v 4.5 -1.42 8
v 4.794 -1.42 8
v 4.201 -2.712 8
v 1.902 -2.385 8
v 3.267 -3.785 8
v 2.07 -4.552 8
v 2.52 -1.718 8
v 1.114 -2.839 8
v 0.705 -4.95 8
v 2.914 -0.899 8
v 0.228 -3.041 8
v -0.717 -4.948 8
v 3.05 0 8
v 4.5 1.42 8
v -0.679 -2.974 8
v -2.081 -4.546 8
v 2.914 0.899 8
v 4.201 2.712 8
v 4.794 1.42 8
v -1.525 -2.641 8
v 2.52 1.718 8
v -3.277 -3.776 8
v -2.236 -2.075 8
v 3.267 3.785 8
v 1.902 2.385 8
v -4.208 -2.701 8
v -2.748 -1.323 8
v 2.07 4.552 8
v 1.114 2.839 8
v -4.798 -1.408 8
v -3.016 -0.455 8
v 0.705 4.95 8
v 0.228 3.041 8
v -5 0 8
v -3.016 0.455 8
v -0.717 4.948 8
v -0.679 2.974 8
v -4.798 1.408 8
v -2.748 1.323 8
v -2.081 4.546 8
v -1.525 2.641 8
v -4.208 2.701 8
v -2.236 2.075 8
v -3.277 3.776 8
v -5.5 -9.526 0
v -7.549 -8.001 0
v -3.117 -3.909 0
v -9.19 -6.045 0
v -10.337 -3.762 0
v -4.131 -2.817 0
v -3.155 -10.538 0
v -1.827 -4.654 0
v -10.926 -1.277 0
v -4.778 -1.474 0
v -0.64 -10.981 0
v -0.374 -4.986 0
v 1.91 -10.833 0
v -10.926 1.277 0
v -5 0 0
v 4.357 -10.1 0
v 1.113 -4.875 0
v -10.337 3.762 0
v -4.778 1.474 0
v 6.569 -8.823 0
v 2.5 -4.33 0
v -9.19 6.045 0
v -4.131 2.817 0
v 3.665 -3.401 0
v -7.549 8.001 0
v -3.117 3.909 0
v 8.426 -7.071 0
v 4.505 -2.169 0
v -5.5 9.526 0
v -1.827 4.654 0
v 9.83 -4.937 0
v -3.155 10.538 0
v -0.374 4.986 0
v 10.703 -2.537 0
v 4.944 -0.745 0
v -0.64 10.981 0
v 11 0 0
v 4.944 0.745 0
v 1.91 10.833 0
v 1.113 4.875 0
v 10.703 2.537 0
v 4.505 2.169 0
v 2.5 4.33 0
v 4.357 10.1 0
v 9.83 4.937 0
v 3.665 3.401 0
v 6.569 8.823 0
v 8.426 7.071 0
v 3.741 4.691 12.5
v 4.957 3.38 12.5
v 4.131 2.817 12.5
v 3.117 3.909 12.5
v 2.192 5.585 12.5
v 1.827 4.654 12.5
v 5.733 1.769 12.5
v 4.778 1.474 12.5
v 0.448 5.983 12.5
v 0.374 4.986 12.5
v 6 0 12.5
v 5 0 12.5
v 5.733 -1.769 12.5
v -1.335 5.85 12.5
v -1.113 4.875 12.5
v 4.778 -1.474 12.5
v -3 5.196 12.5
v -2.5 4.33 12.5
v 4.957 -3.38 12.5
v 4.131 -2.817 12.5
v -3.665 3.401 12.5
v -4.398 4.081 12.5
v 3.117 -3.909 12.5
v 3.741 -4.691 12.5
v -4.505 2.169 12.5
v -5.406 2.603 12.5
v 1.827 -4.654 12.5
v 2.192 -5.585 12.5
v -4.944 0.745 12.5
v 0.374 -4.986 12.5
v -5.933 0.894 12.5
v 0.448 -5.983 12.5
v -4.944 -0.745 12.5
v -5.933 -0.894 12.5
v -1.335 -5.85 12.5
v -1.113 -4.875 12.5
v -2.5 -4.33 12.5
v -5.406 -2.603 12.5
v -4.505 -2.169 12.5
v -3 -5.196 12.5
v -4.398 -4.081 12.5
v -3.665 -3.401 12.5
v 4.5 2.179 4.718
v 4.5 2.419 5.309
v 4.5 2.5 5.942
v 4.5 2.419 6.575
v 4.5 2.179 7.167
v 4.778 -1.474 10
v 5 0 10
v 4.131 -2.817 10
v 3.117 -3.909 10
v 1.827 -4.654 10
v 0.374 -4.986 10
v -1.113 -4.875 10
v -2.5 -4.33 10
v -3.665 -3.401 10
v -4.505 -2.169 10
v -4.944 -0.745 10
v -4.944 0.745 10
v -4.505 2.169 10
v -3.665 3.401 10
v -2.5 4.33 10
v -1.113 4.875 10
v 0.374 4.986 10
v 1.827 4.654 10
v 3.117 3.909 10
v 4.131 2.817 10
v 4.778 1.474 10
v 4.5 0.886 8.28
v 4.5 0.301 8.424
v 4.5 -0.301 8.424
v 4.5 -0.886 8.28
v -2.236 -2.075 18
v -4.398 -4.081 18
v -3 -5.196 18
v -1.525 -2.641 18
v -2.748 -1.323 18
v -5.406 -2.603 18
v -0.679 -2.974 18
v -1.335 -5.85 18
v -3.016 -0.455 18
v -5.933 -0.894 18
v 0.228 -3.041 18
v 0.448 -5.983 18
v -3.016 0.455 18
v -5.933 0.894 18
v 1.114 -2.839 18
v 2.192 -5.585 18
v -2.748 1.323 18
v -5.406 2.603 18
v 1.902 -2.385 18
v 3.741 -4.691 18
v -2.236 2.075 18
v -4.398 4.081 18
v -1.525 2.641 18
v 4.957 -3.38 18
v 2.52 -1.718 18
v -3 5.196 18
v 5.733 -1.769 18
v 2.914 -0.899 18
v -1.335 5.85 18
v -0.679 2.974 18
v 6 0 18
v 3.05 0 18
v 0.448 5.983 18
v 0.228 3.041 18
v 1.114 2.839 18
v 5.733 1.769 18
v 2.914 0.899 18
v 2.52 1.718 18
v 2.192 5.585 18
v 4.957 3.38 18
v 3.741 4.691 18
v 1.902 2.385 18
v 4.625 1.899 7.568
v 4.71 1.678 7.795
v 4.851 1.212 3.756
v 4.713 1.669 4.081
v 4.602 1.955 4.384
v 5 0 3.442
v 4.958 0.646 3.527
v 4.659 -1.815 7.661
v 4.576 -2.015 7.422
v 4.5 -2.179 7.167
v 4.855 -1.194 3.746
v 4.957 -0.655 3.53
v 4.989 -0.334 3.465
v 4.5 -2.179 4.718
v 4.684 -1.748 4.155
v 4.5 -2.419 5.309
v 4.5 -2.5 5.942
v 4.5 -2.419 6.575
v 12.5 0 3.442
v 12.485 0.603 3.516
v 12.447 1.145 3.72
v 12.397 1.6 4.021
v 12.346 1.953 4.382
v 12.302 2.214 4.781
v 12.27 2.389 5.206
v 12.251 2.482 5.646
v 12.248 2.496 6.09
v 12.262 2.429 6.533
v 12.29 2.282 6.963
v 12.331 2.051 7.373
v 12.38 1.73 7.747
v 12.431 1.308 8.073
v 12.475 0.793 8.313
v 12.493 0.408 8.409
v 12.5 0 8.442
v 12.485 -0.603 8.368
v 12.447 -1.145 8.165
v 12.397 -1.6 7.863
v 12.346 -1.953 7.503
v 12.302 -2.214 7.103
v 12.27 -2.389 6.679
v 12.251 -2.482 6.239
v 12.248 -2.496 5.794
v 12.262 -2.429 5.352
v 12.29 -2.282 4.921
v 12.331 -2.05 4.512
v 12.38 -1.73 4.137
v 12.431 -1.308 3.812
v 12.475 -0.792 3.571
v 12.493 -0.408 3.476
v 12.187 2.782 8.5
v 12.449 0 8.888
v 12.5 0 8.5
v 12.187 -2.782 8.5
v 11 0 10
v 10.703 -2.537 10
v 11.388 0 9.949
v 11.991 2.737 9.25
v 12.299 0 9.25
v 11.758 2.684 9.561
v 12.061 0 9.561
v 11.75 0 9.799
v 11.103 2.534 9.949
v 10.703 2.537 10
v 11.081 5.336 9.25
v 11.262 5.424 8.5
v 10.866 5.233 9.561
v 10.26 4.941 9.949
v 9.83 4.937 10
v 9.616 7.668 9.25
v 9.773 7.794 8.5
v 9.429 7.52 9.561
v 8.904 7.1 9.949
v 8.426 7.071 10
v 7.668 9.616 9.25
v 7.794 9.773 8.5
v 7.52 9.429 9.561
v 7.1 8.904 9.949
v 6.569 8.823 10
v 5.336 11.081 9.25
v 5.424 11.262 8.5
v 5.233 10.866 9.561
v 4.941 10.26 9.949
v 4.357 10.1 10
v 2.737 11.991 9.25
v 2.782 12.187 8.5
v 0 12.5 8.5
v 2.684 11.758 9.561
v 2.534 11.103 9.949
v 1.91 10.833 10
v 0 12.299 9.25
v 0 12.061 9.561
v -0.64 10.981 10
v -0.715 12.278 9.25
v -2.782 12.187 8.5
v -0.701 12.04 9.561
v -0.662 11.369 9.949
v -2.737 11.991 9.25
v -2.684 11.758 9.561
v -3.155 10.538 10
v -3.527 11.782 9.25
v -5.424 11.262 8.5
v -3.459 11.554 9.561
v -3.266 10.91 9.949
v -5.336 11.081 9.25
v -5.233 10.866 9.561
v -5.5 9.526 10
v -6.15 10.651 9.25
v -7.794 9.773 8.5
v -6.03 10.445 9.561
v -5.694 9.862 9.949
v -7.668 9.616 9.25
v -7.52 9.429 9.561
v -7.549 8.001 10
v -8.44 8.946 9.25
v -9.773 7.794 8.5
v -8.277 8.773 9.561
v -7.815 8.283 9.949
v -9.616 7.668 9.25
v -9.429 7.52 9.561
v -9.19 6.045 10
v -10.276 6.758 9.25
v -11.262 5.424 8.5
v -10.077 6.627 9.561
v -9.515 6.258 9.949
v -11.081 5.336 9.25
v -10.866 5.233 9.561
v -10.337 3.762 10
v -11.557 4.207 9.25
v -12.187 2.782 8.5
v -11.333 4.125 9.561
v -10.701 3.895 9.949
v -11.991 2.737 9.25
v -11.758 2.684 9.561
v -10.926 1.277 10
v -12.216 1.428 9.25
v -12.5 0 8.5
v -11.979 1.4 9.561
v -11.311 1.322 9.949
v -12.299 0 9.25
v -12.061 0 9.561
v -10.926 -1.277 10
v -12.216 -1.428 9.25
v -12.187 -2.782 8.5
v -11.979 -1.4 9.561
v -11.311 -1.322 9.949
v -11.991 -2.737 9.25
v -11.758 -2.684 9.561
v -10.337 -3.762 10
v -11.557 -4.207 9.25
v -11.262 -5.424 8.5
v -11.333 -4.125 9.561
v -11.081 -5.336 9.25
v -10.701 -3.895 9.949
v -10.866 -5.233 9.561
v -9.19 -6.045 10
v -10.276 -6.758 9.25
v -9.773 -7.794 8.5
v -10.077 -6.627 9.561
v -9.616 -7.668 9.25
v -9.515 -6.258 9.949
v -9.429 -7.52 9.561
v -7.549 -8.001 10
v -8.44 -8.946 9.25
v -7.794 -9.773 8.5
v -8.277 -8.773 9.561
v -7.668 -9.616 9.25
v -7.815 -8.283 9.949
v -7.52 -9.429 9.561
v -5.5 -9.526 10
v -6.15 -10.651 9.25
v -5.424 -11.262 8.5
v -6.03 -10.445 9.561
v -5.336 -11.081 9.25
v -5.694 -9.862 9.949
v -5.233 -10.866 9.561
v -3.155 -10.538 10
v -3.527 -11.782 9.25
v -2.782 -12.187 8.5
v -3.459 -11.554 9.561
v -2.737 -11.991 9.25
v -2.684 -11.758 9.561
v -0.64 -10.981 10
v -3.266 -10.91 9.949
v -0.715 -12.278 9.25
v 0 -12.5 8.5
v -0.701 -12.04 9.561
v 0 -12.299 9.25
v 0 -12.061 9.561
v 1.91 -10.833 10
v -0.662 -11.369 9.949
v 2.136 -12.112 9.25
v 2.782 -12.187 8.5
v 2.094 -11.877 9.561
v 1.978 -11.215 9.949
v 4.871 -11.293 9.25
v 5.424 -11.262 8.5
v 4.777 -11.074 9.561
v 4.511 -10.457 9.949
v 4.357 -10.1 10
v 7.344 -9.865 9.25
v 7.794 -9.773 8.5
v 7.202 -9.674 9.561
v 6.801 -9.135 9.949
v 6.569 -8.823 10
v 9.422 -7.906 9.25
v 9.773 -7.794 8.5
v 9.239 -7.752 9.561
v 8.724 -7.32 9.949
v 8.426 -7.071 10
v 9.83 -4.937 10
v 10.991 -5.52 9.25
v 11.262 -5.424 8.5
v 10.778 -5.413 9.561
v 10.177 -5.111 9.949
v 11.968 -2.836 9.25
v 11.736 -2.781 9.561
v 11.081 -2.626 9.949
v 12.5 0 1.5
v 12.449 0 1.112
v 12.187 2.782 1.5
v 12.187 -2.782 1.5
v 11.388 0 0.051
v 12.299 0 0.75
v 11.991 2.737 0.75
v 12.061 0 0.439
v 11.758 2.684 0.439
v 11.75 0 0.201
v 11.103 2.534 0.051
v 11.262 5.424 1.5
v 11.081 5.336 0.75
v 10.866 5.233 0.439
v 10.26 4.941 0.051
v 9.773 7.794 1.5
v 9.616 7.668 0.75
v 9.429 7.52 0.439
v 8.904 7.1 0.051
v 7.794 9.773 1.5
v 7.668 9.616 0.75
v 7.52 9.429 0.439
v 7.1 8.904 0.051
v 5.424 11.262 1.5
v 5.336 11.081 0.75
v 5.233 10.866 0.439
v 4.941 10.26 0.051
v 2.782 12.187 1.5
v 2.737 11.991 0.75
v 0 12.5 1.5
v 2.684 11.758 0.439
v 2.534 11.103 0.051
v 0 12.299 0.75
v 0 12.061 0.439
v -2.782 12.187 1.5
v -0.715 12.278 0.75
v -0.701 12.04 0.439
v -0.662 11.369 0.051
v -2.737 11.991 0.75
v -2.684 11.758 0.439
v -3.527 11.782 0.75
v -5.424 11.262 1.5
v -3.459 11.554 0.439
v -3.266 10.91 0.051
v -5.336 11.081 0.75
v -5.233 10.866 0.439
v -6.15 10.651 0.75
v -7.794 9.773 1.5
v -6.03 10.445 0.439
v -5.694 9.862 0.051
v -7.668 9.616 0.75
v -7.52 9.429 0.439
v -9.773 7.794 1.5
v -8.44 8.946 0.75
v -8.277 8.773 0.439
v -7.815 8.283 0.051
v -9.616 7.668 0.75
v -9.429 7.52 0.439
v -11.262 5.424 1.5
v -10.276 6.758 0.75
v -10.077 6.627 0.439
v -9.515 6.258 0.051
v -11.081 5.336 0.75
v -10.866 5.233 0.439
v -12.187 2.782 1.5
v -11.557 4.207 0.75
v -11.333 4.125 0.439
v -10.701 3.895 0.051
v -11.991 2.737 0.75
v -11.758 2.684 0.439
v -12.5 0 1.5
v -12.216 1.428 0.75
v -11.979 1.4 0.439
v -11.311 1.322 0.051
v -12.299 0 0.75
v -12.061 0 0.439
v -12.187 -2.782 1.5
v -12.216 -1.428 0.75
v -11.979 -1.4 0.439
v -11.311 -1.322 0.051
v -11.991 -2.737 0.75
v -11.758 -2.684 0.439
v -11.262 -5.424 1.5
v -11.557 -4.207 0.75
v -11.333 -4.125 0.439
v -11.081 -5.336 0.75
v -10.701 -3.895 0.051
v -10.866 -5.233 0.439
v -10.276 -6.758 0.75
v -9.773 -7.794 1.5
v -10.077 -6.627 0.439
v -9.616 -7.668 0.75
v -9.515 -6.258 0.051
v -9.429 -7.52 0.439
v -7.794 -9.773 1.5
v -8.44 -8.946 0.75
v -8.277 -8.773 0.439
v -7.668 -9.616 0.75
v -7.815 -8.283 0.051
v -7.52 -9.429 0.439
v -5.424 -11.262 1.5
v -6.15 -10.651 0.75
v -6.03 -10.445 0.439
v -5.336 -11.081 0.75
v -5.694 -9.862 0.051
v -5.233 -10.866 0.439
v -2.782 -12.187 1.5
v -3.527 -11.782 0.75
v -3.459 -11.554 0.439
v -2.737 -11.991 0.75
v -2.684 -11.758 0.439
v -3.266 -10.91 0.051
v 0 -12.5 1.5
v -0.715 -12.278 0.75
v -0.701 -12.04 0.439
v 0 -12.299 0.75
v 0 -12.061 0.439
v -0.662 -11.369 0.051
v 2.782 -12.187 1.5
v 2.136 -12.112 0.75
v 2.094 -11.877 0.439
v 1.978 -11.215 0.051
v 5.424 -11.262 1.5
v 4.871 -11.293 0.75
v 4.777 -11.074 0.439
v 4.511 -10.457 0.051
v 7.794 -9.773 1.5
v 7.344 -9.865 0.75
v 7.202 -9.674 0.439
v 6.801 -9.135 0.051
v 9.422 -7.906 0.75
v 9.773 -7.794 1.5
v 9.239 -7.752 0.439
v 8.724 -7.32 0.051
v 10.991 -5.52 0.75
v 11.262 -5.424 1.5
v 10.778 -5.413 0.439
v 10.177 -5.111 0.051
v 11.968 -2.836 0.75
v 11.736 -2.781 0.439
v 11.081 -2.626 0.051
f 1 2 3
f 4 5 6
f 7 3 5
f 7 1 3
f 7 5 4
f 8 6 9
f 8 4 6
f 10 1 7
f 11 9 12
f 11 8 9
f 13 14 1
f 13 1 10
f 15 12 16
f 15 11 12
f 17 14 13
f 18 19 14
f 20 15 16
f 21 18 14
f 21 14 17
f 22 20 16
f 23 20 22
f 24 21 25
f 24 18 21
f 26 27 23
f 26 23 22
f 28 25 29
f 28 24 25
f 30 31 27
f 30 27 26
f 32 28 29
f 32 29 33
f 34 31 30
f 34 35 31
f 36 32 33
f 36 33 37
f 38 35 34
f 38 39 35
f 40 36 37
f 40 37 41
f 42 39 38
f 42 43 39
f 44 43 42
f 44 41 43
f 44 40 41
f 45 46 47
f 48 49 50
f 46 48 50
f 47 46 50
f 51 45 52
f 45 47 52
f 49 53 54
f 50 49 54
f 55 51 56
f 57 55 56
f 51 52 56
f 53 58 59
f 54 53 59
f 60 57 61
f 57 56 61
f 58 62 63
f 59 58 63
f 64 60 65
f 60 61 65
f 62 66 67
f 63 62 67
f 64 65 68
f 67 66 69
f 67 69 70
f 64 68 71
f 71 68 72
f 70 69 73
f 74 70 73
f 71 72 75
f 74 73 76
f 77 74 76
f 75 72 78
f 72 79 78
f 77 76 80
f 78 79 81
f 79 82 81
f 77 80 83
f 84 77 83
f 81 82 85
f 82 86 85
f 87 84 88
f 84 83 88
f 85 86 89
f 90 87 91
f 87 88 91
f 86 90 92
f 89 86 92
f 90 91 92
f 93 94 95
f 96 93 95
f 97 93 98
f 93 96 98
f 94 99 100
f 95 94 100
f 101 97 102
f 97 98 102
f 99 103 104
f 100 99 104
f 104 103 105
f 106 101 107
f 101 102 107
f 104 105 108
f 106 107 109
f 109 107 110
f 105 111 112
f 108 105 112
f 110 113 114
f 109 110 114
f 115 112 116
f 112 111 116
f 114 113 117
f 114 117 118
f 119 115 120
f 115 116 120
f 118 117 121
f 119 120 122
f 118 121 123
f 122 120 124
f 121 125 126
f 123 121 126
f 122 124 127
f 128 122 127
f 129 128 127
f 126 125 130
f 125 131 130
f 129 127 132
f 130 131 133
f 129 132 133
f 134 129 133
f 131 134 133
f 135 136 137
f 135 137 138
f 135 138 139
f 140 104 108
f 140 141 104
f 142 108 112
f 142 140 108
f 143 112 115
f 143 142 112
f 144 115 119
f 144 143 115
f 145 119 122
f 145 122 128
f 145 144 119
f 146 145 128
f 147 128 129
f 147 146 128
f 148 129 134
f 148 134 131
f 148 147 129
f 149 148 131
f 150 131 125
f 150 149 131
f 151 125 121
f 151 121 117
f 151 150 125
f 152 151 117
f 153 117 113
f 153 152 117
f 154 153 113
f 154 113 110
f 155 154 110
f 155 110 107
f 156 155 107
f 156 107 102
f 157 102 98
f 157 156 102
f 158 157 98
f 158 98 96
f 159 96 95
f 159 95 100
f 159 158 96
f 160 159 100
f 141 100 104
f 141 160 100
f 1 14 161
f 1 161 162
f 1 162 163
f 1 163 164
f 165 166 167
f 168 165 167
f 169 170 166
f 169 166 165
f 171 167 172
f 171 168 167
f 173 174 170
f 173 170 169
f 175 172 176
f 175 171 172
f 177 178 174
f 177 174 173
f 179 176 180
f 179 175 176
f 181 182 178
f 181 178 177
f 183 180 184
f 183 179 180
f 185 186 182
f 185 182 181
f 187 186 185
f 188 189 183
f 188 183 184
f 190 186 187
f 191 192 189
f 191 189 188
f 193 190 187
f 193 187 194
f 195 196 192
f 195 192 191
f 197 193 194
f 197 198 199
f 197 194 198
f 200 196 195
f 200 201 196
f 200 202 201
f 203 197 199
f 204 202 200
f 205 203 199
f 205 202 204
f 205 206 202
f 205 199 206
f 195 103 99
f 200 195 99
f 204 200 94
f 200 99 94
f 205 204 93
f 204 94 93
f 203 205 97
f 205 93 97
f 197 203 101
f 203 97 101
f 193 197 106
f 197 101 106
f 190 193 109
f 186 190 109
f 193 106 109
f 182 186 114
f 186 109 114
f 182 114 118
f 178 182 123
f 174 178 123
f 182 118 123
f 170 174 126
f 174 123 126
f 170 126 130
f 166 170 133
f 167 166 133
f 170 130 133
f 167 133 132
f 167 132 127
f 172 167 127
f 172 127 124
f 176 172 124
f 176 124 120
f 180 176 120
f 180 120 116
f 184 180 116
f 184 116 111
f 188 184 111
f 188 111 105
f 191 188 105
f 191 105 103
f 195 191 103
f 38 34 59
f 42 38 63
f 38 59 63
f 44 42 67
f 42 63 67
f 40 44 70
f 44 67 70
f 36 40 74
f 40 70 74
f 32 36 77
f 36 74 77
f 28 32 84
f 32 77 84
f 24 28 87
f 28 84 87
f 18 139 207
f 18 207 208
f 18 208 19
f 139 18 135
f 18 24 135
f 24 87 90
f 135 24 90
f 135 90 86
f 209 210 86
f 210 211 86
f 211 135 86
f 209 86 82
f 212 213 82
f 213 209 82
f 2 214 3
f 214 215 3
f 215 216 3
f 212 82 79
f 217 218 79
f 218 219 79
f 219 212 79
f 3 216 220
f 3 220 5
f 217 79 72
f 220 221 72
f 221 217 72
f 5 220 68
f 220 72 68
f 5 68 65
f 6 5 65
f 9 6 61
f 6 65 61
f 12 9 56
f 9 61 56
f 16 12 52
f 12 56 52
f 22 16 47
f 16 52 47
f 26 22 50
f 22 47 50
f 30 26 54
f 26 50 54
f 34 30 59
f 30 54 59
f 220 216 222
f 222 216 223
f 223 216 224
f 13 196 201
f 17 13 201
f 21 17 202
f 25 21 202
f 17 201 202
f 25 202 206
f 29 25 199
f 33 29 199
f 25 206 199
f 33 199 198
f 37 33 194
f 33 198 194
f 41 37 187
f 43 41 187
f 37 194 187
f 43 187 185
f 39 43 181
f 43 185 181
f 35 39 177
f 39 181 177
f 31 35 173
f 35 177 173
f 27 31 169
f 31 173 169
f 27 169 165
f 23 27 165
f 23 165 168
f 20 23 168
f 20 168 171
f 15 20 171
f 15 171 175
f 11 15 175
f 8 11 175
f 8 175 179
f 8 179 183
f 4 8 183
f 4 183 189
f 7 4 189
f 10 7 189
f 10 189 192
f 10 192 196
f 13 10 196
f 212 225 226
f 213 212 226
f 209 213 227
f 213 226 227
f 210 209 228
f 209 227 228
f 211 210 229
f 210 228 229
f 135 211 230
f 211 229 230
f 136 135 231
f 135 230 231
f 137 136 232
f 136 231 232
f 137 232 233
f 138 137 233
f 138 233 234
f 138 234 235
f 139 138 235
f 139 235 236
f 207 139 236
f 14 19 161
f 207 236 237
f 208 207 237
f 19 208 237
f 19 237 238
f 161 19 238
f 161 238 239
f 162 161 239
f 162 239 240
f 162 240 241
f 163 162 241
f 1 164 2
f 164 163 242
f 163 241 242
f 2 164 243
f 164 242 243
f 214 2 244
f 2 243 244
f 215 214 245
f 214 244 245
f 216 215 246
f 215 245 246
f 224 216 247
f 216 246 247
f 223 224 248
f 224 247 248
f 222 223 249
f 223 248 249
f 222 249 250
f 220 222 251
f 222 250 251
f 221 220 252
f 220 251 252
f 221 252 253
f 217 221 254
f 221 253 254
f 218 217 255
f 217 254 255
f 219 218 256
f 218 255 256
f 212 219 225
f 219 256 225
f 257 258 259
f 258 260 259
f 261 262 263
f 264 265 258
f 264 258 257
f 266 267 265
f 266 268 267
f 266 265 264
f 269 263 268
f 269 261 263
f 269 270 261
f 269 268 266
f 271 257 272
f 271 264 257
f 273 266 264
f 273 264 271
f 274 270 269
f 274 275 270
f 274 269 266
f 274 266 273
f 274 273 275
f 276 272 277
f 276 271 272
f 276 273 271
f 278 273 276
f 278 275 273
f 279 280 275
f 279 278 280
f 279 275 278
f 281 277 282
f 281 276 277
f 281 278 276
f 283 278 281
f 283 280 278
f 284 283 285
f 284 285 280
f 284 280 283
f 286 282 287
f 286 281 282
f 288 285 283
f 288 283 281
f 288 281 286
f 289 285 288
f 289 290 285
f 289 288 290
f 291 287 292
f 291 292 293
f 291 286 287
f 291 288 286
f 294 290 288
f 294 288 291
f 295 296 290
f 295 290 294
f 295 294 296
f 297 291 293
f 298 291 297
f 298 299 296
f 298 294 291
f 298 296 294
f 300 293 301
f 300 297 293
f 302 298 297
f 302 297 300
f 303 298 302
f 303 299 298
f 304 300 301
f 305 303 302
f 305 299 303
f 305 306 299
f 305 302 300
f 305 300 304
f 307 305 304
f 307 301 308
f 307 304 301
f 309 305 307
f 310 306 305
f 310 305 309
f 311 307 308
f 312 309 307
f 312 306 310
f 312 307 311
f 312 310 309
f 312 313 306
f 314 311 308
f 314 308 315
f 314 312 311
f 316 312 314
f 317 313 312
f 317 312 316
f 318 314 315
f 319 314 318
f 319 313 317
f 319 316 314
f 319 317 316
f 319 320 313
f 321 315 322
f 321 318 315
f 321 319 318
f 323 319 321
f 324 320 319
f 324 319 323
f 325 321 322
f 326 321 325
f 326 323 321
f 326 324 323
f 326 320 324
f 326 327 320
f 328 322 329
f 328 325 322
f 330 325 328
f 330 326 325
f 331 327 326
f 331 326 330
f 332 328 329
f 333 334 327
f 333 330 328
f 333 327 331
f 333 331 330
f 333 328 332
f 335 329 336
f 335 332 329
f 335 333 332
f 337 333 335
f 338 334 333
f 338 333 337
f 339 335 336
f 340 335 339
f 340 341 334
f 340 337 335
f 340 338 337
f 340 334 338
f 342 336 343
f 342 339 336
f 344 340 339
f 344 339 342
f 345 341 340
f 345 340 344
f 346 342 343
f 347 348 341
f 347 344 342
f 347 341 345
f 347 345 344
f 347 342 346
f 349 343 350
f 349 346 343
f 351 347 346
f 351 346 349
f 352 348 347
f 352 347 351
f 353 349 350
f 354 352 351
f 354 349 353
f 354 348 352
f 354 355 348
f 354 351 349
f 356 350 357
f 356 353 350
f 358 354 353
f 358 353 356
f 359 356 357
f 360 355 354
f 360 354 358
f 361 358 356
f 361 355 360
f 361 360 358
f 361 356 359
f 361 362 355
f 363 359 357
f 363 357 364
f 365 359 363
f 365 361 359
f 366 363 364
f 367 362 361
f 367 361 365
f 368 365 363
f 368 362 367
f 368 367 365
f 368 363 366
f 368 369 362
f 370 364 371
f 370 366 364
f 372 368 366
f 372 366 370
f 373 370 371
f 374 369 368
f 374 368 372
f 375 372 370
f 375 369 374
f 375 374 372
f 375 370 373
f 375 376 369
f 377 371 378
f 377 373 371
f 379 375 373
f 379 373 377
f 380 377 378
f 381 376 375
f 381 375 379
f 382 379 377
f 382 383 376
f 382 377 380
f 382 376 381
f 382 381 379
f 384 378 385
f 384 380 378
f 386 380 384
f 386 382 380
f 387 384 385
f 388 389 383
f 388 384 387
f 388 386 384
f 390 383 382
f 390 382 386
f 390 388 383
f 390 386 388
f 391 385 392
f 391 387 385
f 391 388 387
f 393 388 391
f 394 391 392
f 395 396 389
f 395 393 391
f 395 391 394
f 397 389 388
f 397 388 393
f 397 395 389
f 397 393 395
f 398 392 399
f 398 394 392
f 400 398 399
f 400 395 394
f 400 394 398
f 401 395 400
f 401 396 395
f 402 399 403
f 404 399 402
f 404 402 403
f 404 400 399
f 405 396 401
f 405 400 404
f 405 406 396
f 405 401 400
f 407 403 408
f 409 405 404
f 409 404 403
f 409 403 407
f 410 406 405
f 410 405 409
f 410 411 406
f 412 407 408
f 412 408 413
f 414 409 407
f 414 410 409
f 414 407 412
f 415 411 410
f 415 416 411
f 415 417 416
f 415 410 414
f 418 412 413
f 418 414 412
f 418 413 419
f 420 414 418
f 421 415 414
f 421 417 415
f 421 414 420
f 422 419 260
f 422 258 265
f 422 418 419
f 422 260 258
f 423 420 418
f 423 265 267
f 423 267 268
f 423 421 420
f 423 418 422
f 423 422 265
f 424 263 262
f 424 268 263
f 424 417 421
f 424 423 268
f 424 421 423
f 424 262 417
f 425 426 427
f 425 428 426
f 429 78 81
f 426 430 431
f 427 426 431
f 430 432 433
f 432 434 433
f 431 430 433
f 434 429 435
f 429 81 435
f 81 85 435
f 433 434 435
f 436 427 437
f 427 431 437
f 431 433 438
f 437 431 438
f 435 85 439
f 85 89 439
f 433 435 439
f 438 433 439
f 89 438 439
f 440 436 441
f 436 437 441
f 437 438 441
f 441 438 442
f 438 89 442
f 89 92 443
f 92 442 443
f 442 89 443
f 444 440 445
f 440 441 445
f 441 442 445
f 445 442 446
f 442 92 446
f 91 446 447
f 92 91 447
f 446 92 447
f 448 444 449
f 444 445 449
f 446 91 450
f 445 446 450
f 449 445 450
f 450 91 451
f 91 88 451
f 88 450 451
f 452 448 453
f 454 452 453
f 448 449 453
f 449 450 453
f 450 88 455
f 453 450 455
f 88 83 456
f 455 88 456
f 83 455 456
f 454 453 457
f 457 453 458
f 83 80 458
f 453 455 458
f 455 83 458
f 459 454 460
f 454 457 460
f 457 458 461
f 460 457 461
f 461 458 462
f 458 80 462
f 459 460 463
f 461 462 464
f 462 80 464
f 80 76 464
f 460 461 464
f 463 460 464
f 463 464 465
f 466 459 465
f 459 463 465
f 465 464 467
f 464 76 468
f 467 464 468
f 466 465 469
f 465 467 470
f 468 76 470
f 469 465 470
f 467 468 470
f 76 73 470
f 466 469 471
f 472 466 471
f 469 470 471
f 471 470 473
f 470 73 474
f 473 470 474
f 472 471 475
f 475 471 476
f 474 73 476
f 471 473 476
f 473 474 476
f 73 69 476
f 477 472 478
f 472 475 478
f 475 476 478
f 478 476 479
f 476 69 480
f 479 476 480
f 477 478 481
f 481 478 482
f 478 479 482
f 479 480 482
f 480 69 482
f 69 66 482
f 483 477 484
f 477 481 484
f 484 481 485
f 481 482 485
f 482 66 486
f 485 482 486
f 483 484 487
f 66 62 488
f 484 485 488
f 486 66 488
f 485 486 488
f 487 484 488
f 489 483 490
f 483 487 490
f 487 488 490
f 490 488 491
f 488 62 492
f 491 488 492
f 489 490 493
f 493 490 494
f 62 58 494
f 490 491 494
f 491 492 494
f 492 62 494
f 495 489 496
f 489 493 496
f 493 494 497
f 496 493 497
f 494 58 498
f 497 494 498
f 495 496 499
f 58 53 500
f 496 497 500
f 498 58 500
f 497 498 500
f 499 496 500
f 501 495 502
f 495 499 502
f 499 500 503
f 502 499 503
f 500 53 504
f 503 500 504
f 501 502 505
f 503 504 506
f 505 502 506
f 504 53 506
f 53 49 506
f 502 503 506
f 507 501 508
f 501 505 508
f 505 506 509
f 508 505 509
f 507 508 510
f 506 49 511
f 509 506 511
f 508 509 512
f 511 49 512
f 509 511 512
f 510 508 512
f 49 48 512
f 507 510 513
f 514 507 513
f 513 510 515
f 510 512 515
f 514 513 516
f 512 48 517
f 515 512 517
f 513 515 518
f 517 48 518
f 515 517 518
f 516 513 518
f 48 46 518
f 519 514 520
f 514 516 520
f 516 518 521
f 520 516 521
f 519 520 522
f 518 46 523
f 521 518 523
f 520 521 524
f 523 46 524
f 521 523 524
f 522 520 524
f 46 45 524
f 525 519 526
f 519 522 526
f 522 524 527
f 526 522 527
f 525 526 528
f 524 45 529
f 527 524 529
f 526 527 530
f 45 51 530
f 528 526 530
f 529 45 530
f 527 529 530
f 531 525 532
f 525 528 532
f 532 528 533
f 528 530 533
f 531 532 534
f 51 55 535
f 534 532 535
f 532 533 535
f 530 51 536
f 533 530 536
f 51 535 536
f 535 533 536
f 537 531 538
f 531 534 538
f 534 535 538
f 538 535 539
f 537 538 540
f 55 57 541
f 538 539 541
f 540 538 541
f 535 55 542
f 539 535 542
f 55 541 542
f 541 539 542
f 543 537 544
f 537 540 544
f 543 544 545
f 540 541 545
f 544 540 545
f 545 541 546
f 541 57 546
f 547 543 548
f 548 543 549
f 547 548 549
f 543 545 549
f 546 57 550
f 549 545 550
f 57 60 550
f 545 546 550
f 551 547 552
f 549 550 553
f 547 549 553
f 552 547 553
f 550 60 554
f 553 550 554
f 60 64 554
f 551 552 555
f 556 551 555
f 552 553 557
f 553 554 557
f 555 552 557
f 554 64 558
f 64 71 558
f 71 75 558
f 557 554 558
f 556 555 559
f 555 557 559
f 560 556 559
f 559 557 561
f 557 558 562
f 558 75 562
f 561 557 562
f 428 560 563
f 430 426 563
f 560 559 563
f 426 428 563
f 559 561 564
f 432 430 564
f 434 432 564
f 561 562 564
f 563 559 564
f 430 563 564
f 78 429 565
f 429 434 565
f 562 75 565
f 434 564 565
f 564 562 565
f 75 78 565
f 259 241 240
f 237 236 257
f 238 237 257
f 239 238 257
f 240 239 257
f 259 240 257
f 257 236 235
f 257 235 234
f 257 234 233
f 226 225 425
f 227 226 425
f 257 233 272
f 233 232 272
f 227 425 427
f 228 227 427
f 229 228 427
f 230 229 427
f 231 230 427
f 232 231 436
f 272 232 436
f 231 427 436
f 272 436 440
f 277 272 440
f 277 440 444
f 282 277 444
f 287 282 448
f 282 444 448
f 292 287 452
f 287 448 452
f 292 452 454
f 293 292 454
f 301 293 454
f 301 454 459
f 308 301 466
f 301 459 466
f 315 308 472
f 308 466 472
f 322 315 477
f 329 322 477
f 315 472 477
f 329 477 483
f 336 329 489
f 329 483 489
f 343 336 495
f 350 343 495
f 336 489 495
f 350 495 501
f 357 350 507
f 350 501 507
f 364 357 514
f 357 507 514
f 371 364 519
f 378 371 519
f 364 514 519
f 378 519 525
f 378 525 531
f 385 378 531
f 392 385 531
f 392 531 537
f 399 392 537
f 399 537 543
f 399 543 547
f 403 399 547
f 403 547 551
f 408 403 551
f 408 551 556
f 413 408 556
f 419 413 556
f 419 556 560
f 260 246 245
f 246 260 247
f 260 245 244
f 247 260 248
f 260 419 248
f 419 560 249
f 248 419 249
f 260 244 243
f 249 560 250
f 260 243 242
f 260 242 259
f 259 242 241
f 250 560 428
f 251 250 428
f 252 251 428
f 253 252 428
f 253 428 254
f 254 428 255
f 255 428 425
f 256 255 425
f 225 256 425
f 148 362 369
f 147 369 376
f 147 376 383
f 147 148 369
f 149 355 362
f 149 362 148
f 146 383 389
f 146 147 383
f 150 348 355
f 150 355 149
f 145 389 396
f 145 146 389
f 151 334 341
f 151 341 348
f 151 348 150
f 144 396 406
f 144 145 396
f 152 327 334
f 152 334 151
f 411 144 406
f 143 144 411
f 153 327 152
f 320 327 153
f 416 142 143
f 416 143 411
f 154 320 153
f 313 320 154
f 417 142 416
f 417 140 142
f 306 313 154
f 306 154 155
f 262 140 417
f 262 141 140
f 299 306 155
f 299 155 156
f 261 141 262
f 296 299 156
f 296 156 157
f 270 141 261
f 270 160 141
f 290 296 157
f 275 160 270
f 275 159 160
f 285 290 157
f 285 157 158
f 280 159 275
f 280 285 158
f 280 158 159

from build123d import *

# Parameters (mm, degrees)
ESQUISSE1_R             = 12.5
BASE_EXTRUSION_DEPTH    = 10
ESQUISSE2_R             = 6
BOSS_EXTRU_1_DEPTH      = 8
ESQUISSE3_R             = 3.05
ENL_V_MAT_EXTRU_1_DEPTH = 26.228951623
ESQUISSE4_R             = 5
ENL_V_MAT_EXTRU_2_DEPTH = 8
ESQUISSE5_W             = 2.5
ESQUISSE5_H             = 2
CONG_1_R                = 1.5
ESQUISSE7_R             = 2.5
ENL_V_MAT_EXTRU_4_DEPTH = 8


with BuildPart() as part:
    # Esquisse1 → Base-Extrusion (new body)
    with BuildSketch(Plane.XY):
        Circle(ESQUISSE1_R)
    extrude(amount=BASE_EXTRUSION_DEPTH)

    # Esquisse2 → Boss.-Extru.1 (add)
    with BuildSketch(Plane.XY.offset(10)):
        Circle(ESQUISSE2_R)
    extrude(amount=BOSS_EXTRU_1_DEPTH)

    # Esquisse3 → Enlèv. mat.-Extru.1 (cut, through all)
    with BuildSketch(Plane.XY.offset(18)):
        Circle(ESQUISSE3_R)
    extrude(amount=-ENL_V_MAT_EXTRU_1_DEPTH, mode=Mode.SUBTRACT)

    # Esquisse4 → Enlèv. mat.-Extru.2 (cut)
    with BuildSketch(Plane(origin=(0, 0, 0), x_dir=(-1, 0, 0), z_dir=(0, 0, -1))):
        Circle(ESQUISSE4_R)
    extrude(amount=-ENL_V_MAT_EXTRU_2_DEPTH, mode=Mode.SUBTRACT)

    # Esquisse5 → Enlever de la matière-Révolution1 (revolve, cut)
    with BuildSketch(Plane(origin=(0, 0, 0), x_dir=(0, 0, -1), z_dir=(1, 0, 0)), mode=Mode.PRIVATE) as enlever_de_la_mati_re_r_volution1_sk:
        with Locations((-11.25, 6)):
            Rectangle(ESQUISSE5_W, ESQUISSE5_H)
    revolve(enlever_de_la_mati_re_r_volution1_sk.sketch.rotate(Axis((0, 0, 21.399826727), (0, 0, -1)), 90), axis=Axis((0, 0, 21.399826727), (0, 0, -1)), mode=Mode.SUBTRACT)

    # Congé1
    cong_1_edges = [part.edges().sort_by_distance(p)[0] for p in [
        (-12.5, 0, 0),
        (-12.5, 0, 10),
    ]]
    fillet(cong_1_edges, radius=CONG_1_R)

    # Esquisse7 → Enlèv. mat.-Extru.4 (cut)
    with BuildSketch(Plane(origin=(12.5, 0, 0), x_dir=(0, 0, -1), z_dir=(1, 0, 0))):
        with Locations((-5.942386831, 0)):
            Circle(ESQUISSE7_R)
    extrude(amount=-ENL_V_MAT_EXTRU_4_DEPTH, mode=Mode.SUBTRACT)


solid = part.part
